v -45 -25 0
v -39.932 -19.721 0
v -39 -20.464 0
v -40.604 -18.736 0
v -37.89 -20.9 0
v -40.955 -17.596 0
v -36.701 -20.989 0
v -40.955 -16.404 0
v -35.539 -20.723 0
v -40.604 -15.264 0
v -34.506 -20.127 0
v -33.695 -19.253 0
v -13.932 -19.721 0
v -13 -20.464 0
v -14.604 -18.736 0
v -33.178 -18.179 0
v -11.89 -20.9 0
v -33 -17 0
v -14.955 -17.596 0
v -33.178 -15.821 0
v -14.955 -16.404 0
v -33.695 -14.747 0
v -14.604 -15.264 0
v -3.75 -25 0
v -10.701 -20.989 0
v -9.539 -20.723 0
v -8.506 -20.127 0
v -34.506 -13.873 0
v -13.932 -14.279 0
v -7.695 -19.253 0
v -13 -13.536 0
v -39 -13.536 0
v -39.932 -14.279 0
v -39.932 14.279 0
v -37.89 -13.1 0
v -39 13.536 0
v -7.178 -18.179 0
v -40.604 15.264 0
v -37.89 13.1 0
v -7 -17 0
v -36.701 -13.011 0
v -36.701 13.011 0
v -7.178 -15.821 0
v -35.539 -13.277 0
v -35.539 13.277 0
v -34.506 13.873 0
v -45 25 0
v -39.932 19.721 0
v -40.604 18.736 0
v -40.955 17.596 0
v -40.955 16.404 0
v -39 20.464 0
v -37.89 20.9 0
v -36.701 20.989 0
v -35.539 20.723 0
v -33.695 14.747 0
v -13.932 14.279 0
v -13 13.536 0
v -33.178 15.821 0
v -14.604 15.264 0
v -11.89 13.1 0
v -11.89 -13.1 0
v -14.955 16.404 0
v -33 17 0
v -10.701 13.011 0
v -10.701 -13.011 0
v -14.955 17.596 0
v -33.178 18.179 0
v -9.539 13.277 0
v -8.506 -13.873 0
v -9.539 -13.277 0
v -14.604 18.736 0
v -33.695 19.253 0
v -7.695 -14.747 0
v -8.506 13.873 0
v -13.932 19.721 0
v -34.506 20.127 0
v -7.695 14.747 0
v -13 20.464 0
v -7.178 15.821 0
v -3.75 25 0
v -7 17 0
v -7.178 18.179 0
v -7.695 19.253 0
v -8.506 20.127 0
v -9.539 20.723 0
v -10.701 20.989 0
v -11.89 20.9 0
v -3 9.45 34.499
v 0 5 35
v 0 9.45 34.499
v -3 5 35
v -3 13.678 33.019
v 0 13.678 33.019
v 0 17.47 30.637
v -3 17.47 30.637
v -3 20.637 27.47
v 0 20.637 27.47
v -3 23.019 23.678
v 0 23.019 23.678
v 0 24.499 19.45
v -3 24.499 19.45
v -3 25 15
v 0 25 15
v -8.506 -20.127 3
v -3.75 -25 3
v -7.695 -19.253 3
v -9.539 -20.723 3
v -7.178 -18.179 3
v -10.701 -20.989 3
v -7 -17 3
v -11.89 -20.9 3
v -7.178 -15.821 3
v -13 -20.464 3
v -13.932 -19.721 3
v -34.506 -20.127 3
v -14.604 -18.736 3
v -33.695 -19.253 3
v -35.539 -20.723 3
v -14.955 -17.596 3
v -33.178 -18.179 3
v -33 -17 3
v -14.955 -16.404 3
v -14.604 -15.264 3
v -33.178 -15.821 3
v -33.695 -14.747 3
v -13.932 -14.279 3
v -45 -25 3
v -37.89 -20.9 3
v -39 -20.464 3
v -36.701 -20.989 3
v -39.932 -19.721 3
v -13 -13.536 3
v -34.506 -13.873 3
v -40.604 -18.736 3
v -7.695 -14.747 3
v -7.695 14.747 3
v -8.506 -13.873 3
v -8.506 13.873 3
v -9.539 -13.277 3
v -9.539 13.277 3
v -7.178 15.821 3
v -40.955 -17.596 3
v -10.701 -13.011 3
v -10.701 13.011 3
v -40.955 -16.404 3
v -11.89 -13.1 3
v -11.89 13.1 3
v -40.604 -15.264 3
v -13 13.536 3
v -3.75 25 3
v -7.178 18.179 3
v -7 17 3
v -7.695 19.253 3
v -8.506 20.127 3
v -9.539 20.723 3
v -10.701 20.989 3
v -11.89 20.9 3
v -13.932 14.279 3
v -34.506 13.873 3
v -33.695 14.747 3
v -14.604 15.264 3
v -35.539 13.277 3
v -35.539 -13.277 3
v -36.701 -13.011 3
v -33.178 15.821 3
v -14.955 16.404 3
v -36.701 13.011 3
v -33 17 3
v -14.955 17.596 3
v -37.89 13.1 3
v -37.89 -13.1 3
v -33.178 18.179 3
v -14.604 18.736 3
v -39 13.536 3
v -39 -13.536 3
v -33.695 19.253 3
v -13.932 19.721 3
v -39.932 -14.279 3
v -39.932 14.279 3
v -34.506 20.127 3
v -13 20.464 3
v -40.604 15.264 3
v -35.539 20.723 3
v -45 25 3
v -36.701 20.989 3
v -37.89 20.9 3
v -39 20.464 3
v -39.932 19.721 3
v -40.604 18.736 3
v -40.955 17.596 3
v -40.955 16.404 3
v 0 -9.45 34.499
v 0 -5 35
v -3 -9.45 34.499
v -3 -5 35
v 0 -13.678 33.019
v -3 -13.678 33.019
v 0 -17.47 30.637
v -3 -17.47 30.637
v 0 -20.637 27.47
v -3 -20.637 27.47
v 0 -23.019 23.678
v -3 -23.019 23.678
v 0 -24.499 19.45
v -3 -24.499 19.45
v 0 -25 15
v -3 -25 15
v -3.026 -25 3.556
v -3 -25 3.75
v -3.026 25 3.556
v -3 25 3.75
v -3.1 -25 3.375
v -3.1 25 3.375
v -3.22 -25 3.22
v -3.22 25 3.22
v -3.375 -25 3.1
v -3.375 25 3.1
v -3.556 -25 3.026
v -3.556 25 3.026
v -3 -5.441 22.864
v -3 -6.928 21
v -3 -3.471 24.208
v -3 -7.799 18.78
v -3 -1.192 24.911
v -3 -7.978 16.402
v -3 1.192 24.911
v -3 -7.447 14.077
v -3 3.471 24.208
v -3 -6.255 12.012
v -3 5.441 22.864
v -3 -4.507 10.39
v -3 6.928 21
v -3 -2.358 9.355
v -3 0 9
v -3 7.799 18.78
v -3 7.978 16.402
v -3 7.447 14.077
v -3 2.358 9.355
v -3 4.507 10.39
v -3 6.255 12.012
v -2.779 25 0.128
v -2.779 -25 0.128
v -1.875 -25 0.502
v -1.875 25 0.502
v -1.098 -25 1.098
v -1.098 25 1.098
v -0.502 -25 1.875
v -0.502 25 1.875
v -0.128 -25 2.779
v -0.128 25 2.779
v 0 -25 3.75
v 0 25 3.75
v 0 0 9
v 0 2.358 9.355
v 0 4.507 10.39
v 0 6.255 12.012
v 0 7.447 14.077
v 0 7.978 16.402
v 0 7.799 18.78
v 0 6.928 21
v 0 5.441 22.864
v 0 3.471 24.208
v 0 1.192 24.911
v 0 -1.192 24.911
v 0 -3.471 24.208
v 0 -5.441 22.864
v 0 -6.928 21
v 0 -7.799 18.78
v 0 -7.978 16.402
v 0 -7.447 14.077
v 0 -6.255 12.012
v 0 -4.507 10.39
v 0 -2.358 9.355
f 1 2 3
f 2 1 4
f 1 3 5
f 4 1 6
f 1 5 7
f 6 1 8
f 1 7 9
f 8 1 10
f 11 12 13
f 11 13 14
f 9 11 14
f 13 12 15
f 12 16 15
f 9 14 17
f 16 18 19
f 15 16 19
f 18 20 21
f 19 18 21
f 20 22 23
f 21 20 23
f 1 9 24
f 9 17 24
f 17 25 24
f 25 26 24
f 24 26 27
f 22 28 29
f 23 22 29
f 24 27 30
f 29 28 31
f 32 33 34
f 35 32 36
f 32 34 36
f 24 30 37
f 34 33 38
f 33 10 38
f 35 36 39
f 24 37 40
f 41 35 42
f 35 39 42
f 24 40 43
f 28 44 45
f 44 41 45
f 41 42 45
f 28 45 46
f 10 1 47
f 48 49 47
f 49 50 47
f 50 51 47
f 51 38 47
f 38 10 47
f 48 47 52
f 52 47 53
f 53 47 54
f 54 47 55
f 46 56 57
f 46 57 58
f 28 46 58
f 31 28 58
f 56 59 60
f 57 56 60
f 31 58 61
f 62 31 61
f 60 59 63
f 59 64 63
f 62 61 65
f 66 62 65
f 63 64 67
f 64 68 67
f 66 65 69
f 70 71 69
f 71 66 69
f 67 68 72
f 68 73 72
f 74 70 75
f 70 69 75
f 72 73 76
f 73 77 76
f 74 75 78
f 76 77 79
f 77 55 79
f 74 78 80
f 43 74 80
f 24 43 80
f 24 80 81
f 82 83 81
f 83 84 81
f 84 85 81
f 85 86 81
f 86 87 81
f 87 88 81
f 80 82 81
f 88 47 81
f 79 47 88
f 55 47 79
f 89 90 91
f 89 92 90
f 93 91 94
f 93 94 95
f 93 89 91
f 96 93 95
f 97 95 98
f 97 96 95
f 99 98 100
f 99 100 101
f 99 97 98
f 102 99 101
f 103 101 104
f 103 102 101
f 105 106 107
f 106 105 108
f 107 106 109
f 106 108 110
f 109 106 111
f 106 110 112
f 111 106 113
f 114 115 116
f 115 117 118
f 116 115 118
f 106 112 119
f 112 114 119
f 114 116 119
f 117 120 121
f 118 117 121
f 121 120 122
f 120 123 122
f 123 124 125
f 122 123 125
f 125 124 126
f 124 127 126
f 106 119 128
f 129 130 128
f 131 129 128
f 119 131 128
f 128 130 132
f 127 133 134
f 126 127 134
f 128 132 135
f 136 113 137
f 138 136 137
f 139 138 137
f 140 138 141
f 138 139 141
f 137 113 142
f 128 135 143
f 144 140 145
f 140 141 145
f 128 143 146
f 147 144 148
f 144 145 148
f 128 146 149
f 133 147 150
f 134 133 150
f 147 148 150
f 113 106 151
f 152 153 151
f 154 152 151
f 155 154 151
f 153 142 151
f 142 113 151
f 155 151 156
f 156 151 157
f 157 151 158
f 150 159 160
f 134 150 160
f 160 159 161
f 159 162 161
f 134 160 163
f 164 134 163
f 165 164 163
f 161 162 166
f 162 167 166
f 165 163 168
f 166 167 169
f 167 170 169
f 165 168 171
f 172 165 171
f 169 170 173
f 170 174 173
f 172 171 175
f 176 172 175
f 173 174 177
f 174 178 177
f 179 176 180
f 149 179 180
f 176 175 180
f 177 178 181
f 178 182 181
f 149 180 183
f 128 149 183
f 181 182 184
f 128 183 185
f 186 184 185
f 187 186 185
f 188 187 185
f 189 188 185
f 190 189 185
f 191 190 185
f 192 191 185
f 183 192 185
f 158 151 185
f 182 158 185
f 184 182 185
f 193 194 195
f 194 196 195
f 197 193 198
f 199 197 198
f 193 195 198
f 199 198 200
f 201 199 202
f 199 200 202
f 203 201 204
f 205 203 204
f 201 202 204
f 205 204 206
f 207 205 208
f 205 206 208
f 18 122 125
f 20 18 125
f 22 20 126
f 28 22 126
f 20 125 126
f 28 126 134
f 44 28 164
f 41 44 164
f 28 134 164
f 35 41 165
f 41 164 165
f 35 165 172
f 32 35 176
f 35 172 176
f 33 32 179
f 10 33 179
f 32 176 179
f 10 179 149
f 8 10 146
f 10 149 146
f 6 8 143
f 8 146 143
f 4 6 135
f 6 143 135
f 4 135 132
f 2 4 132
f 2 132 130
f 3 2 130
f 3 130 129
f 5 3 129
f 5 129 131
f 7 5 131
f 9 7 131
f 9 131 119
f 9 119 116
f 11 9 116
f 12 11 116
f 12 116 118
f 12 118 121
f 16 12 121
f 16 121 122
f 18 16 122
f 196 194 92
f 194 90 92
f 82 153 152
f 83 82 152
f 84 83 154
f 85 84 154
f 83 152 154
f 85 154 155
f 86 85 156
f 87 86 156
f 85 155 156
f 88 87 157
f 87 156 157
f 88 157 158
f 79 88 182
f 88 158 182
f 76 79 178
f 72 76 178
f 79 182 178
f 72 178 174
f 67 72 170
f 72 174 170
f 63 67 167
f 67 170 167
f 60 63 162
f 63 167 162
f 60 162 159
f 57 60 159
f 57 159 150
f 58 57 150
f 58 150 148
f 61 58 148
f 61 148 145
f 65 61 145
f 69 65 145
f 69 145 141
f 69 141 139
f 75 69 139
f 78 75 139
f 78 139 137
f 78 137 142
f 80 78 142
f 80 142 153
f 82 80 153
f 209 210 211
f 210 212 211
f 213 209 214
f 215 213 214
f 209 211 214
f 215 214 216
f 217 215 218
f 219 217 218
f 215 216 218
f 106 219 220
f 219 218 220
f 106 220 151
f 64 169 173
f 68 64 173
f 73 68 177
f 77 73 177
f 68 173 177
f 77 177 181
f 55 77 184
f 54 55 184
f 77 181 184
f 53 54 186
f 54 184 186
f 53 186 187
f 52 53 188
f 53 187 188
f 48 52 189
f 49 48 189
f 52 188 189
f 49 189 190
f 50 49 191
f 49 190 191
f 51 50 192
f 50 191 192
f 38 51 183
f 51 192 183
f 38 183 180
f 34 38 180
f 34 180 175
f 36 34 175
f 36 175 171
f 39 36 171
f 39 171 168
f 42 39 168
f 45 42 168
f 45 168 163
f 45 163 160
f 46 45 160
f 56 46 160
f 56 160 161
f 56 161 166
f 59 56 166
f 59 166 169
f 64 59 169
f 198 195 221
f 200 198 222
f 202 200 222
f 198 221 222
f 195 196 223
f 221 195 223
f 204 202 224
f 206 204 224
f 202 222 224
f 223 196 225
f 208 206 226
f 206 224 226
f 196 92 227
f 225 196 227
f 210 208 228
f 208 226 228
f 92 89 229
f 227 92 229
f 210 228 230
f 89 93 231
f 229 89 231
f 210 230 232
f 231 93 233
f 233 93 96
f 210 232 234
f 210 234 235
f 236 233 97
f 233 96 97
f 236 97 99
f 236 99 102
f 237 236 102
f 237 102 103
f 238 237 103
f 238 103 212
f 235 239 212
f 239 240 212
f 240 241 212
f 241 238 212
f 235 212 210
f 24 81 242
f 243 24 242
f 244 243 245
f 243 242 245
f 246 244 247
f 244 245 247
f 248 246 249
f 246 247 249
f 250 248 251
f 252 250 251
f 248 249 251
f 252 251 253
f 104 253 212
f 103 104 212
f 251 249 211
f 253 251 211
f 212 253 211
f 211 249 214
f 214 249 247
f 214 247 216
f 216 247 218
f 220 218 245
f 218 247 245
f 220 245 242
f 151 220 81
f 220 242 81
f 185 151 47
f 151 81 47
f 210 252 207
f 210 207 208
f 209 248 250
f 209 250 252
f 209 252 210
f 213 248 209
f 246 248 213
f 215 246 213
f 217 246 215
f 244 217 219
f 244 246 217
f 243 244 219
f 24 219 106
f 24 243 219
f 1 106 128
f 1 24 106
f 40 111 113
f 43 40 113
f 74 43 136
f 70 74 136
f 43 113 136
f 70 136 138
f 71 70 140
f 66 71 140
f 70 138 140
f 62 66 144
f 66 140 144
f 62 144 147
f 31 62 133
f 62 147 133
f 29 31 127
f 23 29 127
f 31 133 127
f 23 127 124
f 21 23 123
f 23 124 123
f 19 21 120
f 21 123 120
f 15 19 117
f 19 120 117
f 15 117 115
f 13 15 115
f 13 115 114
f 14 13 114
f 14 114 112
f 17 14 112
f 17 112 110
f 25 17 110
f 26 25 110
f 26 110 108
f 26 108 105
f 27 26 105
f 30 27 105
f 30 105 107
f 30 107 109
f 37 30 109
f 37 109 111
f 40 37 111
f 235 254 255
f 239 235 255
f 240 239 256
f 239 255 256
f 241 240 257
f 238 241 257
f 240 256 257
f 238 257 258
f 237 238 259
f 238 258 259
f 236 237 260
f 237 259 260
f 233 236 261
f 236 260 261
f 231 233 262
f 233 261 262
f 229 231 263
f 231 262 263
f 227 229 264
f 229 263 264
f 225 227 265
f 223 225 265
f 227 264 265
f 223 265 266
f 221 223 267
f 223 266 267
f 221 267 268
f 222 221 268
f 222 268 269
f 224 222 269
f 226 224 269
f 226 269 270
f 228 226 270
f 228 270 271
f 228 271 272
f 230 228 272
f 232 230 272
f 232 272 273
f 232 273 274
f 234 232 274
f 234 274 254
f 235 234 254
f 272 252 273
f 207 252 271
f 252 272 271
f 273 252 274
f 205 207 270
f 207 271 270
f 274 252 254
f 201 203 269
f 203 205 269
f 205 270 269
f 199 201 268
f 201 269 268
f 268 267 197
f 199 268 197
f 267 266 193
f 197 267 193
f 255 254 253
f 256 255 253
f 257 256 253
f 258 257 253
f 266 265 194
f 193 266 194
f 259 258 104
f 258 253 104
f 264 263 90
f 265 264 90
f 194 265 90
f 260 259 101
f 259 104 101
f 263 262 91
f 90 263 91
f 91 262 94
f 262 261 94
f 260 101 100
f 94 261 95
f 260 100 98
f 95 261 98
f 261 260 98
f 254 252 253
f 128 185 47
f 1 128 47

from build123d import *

# Parameters (mm, degrees)
SM_BASE_FLANGE_1_DEPTH = 25
FILLET_1_R             = 20
SKETCH_8_R             = 8
CUT_EXTRUDE_1_DEPTH    = 63.24949799
SKETCH_9_R             = 4
CUT_EXTRUDE_2_DEPTH    = 61.613529843


# Sheet-metal steps are written as plain solids
with BuildPart() as part:
    # Sketch 1 → Базовая кромка1 (new body)
    with BuildSketch(Plane(origin=(0, 0, 0), x_dir=(1, 0, 0), z_dir=(0, 1, 0))):
        with BuildLine():
            Line((-45, 0), (-3.75, 0))
            ThreePointArc((-3.75, 0), (-1.098349571, -1.098349571), (0, -3.75))
            Line((0, -3.75), (0, -35))
            Line((0, -35), (-3, -35))
            Line((-3, -35), (-3, -3.75))
            ThreePointArc((-3, -3.75), (-3.219669914, -3.219669914), (-3.75, -3))
            Line((-3.75, -3), (-45, -3))
            Line((-45, -3), (-45, 0))
        make_face()
    extrude(amount=SM_BASE_FLANGE_1_DEPTH)

    # Скругление1
    fillet_1_edges = [part.edges().sort_by_distance(p)[0] for p in [
        (-1.5, 25, 35),
    ]]
    fillet(fillet_1_edges, radius=FILLET_1_R)

    # Зеркальное отражение1: part across plane


with BuildPart() as part_1:
    add(part.part)
    add(part.part.mirror(Plane(origin=(-3.75, 0, 3.75), x_dir=(0, 0, 1), z_dir=(0, 1, 0))))

    # Эскиз8 → Вырез-Вытянуть1 (cut, through all)
    with BuildSketch(Plane(origin=(0, 0, 0), x_dir=(0, 0, -1), z_dir=(1, 0, 0))):
        with Locations((-17, 0)):
            Circle(SKETCH_8_R)
    extrude(amount=-CUT_EXTRUDE_1_DEPTH, mode=Mode.SUBTRACT)

    # Эскиз9 → Вырез-Вытянуть2 (cut, through all)
    with BuildSketch(Plane.XY.offset(3)):
        with Locations((-37, 17)):
            Circle(SKETCH_9_R)
        with Locations((-11, 17)):
            Circle(SKETCH_9_R)
        with Locations((-11, -17)):
            Circle(SKETCH_9_R)
        with Locations((-37, -17)):
            Circle(SKETCH_9_R)
    extrude(amount=-CUT_EXTRUDE_2_DEPTH, mode=Mode.SUBTRACT)


solid = part_1.part
